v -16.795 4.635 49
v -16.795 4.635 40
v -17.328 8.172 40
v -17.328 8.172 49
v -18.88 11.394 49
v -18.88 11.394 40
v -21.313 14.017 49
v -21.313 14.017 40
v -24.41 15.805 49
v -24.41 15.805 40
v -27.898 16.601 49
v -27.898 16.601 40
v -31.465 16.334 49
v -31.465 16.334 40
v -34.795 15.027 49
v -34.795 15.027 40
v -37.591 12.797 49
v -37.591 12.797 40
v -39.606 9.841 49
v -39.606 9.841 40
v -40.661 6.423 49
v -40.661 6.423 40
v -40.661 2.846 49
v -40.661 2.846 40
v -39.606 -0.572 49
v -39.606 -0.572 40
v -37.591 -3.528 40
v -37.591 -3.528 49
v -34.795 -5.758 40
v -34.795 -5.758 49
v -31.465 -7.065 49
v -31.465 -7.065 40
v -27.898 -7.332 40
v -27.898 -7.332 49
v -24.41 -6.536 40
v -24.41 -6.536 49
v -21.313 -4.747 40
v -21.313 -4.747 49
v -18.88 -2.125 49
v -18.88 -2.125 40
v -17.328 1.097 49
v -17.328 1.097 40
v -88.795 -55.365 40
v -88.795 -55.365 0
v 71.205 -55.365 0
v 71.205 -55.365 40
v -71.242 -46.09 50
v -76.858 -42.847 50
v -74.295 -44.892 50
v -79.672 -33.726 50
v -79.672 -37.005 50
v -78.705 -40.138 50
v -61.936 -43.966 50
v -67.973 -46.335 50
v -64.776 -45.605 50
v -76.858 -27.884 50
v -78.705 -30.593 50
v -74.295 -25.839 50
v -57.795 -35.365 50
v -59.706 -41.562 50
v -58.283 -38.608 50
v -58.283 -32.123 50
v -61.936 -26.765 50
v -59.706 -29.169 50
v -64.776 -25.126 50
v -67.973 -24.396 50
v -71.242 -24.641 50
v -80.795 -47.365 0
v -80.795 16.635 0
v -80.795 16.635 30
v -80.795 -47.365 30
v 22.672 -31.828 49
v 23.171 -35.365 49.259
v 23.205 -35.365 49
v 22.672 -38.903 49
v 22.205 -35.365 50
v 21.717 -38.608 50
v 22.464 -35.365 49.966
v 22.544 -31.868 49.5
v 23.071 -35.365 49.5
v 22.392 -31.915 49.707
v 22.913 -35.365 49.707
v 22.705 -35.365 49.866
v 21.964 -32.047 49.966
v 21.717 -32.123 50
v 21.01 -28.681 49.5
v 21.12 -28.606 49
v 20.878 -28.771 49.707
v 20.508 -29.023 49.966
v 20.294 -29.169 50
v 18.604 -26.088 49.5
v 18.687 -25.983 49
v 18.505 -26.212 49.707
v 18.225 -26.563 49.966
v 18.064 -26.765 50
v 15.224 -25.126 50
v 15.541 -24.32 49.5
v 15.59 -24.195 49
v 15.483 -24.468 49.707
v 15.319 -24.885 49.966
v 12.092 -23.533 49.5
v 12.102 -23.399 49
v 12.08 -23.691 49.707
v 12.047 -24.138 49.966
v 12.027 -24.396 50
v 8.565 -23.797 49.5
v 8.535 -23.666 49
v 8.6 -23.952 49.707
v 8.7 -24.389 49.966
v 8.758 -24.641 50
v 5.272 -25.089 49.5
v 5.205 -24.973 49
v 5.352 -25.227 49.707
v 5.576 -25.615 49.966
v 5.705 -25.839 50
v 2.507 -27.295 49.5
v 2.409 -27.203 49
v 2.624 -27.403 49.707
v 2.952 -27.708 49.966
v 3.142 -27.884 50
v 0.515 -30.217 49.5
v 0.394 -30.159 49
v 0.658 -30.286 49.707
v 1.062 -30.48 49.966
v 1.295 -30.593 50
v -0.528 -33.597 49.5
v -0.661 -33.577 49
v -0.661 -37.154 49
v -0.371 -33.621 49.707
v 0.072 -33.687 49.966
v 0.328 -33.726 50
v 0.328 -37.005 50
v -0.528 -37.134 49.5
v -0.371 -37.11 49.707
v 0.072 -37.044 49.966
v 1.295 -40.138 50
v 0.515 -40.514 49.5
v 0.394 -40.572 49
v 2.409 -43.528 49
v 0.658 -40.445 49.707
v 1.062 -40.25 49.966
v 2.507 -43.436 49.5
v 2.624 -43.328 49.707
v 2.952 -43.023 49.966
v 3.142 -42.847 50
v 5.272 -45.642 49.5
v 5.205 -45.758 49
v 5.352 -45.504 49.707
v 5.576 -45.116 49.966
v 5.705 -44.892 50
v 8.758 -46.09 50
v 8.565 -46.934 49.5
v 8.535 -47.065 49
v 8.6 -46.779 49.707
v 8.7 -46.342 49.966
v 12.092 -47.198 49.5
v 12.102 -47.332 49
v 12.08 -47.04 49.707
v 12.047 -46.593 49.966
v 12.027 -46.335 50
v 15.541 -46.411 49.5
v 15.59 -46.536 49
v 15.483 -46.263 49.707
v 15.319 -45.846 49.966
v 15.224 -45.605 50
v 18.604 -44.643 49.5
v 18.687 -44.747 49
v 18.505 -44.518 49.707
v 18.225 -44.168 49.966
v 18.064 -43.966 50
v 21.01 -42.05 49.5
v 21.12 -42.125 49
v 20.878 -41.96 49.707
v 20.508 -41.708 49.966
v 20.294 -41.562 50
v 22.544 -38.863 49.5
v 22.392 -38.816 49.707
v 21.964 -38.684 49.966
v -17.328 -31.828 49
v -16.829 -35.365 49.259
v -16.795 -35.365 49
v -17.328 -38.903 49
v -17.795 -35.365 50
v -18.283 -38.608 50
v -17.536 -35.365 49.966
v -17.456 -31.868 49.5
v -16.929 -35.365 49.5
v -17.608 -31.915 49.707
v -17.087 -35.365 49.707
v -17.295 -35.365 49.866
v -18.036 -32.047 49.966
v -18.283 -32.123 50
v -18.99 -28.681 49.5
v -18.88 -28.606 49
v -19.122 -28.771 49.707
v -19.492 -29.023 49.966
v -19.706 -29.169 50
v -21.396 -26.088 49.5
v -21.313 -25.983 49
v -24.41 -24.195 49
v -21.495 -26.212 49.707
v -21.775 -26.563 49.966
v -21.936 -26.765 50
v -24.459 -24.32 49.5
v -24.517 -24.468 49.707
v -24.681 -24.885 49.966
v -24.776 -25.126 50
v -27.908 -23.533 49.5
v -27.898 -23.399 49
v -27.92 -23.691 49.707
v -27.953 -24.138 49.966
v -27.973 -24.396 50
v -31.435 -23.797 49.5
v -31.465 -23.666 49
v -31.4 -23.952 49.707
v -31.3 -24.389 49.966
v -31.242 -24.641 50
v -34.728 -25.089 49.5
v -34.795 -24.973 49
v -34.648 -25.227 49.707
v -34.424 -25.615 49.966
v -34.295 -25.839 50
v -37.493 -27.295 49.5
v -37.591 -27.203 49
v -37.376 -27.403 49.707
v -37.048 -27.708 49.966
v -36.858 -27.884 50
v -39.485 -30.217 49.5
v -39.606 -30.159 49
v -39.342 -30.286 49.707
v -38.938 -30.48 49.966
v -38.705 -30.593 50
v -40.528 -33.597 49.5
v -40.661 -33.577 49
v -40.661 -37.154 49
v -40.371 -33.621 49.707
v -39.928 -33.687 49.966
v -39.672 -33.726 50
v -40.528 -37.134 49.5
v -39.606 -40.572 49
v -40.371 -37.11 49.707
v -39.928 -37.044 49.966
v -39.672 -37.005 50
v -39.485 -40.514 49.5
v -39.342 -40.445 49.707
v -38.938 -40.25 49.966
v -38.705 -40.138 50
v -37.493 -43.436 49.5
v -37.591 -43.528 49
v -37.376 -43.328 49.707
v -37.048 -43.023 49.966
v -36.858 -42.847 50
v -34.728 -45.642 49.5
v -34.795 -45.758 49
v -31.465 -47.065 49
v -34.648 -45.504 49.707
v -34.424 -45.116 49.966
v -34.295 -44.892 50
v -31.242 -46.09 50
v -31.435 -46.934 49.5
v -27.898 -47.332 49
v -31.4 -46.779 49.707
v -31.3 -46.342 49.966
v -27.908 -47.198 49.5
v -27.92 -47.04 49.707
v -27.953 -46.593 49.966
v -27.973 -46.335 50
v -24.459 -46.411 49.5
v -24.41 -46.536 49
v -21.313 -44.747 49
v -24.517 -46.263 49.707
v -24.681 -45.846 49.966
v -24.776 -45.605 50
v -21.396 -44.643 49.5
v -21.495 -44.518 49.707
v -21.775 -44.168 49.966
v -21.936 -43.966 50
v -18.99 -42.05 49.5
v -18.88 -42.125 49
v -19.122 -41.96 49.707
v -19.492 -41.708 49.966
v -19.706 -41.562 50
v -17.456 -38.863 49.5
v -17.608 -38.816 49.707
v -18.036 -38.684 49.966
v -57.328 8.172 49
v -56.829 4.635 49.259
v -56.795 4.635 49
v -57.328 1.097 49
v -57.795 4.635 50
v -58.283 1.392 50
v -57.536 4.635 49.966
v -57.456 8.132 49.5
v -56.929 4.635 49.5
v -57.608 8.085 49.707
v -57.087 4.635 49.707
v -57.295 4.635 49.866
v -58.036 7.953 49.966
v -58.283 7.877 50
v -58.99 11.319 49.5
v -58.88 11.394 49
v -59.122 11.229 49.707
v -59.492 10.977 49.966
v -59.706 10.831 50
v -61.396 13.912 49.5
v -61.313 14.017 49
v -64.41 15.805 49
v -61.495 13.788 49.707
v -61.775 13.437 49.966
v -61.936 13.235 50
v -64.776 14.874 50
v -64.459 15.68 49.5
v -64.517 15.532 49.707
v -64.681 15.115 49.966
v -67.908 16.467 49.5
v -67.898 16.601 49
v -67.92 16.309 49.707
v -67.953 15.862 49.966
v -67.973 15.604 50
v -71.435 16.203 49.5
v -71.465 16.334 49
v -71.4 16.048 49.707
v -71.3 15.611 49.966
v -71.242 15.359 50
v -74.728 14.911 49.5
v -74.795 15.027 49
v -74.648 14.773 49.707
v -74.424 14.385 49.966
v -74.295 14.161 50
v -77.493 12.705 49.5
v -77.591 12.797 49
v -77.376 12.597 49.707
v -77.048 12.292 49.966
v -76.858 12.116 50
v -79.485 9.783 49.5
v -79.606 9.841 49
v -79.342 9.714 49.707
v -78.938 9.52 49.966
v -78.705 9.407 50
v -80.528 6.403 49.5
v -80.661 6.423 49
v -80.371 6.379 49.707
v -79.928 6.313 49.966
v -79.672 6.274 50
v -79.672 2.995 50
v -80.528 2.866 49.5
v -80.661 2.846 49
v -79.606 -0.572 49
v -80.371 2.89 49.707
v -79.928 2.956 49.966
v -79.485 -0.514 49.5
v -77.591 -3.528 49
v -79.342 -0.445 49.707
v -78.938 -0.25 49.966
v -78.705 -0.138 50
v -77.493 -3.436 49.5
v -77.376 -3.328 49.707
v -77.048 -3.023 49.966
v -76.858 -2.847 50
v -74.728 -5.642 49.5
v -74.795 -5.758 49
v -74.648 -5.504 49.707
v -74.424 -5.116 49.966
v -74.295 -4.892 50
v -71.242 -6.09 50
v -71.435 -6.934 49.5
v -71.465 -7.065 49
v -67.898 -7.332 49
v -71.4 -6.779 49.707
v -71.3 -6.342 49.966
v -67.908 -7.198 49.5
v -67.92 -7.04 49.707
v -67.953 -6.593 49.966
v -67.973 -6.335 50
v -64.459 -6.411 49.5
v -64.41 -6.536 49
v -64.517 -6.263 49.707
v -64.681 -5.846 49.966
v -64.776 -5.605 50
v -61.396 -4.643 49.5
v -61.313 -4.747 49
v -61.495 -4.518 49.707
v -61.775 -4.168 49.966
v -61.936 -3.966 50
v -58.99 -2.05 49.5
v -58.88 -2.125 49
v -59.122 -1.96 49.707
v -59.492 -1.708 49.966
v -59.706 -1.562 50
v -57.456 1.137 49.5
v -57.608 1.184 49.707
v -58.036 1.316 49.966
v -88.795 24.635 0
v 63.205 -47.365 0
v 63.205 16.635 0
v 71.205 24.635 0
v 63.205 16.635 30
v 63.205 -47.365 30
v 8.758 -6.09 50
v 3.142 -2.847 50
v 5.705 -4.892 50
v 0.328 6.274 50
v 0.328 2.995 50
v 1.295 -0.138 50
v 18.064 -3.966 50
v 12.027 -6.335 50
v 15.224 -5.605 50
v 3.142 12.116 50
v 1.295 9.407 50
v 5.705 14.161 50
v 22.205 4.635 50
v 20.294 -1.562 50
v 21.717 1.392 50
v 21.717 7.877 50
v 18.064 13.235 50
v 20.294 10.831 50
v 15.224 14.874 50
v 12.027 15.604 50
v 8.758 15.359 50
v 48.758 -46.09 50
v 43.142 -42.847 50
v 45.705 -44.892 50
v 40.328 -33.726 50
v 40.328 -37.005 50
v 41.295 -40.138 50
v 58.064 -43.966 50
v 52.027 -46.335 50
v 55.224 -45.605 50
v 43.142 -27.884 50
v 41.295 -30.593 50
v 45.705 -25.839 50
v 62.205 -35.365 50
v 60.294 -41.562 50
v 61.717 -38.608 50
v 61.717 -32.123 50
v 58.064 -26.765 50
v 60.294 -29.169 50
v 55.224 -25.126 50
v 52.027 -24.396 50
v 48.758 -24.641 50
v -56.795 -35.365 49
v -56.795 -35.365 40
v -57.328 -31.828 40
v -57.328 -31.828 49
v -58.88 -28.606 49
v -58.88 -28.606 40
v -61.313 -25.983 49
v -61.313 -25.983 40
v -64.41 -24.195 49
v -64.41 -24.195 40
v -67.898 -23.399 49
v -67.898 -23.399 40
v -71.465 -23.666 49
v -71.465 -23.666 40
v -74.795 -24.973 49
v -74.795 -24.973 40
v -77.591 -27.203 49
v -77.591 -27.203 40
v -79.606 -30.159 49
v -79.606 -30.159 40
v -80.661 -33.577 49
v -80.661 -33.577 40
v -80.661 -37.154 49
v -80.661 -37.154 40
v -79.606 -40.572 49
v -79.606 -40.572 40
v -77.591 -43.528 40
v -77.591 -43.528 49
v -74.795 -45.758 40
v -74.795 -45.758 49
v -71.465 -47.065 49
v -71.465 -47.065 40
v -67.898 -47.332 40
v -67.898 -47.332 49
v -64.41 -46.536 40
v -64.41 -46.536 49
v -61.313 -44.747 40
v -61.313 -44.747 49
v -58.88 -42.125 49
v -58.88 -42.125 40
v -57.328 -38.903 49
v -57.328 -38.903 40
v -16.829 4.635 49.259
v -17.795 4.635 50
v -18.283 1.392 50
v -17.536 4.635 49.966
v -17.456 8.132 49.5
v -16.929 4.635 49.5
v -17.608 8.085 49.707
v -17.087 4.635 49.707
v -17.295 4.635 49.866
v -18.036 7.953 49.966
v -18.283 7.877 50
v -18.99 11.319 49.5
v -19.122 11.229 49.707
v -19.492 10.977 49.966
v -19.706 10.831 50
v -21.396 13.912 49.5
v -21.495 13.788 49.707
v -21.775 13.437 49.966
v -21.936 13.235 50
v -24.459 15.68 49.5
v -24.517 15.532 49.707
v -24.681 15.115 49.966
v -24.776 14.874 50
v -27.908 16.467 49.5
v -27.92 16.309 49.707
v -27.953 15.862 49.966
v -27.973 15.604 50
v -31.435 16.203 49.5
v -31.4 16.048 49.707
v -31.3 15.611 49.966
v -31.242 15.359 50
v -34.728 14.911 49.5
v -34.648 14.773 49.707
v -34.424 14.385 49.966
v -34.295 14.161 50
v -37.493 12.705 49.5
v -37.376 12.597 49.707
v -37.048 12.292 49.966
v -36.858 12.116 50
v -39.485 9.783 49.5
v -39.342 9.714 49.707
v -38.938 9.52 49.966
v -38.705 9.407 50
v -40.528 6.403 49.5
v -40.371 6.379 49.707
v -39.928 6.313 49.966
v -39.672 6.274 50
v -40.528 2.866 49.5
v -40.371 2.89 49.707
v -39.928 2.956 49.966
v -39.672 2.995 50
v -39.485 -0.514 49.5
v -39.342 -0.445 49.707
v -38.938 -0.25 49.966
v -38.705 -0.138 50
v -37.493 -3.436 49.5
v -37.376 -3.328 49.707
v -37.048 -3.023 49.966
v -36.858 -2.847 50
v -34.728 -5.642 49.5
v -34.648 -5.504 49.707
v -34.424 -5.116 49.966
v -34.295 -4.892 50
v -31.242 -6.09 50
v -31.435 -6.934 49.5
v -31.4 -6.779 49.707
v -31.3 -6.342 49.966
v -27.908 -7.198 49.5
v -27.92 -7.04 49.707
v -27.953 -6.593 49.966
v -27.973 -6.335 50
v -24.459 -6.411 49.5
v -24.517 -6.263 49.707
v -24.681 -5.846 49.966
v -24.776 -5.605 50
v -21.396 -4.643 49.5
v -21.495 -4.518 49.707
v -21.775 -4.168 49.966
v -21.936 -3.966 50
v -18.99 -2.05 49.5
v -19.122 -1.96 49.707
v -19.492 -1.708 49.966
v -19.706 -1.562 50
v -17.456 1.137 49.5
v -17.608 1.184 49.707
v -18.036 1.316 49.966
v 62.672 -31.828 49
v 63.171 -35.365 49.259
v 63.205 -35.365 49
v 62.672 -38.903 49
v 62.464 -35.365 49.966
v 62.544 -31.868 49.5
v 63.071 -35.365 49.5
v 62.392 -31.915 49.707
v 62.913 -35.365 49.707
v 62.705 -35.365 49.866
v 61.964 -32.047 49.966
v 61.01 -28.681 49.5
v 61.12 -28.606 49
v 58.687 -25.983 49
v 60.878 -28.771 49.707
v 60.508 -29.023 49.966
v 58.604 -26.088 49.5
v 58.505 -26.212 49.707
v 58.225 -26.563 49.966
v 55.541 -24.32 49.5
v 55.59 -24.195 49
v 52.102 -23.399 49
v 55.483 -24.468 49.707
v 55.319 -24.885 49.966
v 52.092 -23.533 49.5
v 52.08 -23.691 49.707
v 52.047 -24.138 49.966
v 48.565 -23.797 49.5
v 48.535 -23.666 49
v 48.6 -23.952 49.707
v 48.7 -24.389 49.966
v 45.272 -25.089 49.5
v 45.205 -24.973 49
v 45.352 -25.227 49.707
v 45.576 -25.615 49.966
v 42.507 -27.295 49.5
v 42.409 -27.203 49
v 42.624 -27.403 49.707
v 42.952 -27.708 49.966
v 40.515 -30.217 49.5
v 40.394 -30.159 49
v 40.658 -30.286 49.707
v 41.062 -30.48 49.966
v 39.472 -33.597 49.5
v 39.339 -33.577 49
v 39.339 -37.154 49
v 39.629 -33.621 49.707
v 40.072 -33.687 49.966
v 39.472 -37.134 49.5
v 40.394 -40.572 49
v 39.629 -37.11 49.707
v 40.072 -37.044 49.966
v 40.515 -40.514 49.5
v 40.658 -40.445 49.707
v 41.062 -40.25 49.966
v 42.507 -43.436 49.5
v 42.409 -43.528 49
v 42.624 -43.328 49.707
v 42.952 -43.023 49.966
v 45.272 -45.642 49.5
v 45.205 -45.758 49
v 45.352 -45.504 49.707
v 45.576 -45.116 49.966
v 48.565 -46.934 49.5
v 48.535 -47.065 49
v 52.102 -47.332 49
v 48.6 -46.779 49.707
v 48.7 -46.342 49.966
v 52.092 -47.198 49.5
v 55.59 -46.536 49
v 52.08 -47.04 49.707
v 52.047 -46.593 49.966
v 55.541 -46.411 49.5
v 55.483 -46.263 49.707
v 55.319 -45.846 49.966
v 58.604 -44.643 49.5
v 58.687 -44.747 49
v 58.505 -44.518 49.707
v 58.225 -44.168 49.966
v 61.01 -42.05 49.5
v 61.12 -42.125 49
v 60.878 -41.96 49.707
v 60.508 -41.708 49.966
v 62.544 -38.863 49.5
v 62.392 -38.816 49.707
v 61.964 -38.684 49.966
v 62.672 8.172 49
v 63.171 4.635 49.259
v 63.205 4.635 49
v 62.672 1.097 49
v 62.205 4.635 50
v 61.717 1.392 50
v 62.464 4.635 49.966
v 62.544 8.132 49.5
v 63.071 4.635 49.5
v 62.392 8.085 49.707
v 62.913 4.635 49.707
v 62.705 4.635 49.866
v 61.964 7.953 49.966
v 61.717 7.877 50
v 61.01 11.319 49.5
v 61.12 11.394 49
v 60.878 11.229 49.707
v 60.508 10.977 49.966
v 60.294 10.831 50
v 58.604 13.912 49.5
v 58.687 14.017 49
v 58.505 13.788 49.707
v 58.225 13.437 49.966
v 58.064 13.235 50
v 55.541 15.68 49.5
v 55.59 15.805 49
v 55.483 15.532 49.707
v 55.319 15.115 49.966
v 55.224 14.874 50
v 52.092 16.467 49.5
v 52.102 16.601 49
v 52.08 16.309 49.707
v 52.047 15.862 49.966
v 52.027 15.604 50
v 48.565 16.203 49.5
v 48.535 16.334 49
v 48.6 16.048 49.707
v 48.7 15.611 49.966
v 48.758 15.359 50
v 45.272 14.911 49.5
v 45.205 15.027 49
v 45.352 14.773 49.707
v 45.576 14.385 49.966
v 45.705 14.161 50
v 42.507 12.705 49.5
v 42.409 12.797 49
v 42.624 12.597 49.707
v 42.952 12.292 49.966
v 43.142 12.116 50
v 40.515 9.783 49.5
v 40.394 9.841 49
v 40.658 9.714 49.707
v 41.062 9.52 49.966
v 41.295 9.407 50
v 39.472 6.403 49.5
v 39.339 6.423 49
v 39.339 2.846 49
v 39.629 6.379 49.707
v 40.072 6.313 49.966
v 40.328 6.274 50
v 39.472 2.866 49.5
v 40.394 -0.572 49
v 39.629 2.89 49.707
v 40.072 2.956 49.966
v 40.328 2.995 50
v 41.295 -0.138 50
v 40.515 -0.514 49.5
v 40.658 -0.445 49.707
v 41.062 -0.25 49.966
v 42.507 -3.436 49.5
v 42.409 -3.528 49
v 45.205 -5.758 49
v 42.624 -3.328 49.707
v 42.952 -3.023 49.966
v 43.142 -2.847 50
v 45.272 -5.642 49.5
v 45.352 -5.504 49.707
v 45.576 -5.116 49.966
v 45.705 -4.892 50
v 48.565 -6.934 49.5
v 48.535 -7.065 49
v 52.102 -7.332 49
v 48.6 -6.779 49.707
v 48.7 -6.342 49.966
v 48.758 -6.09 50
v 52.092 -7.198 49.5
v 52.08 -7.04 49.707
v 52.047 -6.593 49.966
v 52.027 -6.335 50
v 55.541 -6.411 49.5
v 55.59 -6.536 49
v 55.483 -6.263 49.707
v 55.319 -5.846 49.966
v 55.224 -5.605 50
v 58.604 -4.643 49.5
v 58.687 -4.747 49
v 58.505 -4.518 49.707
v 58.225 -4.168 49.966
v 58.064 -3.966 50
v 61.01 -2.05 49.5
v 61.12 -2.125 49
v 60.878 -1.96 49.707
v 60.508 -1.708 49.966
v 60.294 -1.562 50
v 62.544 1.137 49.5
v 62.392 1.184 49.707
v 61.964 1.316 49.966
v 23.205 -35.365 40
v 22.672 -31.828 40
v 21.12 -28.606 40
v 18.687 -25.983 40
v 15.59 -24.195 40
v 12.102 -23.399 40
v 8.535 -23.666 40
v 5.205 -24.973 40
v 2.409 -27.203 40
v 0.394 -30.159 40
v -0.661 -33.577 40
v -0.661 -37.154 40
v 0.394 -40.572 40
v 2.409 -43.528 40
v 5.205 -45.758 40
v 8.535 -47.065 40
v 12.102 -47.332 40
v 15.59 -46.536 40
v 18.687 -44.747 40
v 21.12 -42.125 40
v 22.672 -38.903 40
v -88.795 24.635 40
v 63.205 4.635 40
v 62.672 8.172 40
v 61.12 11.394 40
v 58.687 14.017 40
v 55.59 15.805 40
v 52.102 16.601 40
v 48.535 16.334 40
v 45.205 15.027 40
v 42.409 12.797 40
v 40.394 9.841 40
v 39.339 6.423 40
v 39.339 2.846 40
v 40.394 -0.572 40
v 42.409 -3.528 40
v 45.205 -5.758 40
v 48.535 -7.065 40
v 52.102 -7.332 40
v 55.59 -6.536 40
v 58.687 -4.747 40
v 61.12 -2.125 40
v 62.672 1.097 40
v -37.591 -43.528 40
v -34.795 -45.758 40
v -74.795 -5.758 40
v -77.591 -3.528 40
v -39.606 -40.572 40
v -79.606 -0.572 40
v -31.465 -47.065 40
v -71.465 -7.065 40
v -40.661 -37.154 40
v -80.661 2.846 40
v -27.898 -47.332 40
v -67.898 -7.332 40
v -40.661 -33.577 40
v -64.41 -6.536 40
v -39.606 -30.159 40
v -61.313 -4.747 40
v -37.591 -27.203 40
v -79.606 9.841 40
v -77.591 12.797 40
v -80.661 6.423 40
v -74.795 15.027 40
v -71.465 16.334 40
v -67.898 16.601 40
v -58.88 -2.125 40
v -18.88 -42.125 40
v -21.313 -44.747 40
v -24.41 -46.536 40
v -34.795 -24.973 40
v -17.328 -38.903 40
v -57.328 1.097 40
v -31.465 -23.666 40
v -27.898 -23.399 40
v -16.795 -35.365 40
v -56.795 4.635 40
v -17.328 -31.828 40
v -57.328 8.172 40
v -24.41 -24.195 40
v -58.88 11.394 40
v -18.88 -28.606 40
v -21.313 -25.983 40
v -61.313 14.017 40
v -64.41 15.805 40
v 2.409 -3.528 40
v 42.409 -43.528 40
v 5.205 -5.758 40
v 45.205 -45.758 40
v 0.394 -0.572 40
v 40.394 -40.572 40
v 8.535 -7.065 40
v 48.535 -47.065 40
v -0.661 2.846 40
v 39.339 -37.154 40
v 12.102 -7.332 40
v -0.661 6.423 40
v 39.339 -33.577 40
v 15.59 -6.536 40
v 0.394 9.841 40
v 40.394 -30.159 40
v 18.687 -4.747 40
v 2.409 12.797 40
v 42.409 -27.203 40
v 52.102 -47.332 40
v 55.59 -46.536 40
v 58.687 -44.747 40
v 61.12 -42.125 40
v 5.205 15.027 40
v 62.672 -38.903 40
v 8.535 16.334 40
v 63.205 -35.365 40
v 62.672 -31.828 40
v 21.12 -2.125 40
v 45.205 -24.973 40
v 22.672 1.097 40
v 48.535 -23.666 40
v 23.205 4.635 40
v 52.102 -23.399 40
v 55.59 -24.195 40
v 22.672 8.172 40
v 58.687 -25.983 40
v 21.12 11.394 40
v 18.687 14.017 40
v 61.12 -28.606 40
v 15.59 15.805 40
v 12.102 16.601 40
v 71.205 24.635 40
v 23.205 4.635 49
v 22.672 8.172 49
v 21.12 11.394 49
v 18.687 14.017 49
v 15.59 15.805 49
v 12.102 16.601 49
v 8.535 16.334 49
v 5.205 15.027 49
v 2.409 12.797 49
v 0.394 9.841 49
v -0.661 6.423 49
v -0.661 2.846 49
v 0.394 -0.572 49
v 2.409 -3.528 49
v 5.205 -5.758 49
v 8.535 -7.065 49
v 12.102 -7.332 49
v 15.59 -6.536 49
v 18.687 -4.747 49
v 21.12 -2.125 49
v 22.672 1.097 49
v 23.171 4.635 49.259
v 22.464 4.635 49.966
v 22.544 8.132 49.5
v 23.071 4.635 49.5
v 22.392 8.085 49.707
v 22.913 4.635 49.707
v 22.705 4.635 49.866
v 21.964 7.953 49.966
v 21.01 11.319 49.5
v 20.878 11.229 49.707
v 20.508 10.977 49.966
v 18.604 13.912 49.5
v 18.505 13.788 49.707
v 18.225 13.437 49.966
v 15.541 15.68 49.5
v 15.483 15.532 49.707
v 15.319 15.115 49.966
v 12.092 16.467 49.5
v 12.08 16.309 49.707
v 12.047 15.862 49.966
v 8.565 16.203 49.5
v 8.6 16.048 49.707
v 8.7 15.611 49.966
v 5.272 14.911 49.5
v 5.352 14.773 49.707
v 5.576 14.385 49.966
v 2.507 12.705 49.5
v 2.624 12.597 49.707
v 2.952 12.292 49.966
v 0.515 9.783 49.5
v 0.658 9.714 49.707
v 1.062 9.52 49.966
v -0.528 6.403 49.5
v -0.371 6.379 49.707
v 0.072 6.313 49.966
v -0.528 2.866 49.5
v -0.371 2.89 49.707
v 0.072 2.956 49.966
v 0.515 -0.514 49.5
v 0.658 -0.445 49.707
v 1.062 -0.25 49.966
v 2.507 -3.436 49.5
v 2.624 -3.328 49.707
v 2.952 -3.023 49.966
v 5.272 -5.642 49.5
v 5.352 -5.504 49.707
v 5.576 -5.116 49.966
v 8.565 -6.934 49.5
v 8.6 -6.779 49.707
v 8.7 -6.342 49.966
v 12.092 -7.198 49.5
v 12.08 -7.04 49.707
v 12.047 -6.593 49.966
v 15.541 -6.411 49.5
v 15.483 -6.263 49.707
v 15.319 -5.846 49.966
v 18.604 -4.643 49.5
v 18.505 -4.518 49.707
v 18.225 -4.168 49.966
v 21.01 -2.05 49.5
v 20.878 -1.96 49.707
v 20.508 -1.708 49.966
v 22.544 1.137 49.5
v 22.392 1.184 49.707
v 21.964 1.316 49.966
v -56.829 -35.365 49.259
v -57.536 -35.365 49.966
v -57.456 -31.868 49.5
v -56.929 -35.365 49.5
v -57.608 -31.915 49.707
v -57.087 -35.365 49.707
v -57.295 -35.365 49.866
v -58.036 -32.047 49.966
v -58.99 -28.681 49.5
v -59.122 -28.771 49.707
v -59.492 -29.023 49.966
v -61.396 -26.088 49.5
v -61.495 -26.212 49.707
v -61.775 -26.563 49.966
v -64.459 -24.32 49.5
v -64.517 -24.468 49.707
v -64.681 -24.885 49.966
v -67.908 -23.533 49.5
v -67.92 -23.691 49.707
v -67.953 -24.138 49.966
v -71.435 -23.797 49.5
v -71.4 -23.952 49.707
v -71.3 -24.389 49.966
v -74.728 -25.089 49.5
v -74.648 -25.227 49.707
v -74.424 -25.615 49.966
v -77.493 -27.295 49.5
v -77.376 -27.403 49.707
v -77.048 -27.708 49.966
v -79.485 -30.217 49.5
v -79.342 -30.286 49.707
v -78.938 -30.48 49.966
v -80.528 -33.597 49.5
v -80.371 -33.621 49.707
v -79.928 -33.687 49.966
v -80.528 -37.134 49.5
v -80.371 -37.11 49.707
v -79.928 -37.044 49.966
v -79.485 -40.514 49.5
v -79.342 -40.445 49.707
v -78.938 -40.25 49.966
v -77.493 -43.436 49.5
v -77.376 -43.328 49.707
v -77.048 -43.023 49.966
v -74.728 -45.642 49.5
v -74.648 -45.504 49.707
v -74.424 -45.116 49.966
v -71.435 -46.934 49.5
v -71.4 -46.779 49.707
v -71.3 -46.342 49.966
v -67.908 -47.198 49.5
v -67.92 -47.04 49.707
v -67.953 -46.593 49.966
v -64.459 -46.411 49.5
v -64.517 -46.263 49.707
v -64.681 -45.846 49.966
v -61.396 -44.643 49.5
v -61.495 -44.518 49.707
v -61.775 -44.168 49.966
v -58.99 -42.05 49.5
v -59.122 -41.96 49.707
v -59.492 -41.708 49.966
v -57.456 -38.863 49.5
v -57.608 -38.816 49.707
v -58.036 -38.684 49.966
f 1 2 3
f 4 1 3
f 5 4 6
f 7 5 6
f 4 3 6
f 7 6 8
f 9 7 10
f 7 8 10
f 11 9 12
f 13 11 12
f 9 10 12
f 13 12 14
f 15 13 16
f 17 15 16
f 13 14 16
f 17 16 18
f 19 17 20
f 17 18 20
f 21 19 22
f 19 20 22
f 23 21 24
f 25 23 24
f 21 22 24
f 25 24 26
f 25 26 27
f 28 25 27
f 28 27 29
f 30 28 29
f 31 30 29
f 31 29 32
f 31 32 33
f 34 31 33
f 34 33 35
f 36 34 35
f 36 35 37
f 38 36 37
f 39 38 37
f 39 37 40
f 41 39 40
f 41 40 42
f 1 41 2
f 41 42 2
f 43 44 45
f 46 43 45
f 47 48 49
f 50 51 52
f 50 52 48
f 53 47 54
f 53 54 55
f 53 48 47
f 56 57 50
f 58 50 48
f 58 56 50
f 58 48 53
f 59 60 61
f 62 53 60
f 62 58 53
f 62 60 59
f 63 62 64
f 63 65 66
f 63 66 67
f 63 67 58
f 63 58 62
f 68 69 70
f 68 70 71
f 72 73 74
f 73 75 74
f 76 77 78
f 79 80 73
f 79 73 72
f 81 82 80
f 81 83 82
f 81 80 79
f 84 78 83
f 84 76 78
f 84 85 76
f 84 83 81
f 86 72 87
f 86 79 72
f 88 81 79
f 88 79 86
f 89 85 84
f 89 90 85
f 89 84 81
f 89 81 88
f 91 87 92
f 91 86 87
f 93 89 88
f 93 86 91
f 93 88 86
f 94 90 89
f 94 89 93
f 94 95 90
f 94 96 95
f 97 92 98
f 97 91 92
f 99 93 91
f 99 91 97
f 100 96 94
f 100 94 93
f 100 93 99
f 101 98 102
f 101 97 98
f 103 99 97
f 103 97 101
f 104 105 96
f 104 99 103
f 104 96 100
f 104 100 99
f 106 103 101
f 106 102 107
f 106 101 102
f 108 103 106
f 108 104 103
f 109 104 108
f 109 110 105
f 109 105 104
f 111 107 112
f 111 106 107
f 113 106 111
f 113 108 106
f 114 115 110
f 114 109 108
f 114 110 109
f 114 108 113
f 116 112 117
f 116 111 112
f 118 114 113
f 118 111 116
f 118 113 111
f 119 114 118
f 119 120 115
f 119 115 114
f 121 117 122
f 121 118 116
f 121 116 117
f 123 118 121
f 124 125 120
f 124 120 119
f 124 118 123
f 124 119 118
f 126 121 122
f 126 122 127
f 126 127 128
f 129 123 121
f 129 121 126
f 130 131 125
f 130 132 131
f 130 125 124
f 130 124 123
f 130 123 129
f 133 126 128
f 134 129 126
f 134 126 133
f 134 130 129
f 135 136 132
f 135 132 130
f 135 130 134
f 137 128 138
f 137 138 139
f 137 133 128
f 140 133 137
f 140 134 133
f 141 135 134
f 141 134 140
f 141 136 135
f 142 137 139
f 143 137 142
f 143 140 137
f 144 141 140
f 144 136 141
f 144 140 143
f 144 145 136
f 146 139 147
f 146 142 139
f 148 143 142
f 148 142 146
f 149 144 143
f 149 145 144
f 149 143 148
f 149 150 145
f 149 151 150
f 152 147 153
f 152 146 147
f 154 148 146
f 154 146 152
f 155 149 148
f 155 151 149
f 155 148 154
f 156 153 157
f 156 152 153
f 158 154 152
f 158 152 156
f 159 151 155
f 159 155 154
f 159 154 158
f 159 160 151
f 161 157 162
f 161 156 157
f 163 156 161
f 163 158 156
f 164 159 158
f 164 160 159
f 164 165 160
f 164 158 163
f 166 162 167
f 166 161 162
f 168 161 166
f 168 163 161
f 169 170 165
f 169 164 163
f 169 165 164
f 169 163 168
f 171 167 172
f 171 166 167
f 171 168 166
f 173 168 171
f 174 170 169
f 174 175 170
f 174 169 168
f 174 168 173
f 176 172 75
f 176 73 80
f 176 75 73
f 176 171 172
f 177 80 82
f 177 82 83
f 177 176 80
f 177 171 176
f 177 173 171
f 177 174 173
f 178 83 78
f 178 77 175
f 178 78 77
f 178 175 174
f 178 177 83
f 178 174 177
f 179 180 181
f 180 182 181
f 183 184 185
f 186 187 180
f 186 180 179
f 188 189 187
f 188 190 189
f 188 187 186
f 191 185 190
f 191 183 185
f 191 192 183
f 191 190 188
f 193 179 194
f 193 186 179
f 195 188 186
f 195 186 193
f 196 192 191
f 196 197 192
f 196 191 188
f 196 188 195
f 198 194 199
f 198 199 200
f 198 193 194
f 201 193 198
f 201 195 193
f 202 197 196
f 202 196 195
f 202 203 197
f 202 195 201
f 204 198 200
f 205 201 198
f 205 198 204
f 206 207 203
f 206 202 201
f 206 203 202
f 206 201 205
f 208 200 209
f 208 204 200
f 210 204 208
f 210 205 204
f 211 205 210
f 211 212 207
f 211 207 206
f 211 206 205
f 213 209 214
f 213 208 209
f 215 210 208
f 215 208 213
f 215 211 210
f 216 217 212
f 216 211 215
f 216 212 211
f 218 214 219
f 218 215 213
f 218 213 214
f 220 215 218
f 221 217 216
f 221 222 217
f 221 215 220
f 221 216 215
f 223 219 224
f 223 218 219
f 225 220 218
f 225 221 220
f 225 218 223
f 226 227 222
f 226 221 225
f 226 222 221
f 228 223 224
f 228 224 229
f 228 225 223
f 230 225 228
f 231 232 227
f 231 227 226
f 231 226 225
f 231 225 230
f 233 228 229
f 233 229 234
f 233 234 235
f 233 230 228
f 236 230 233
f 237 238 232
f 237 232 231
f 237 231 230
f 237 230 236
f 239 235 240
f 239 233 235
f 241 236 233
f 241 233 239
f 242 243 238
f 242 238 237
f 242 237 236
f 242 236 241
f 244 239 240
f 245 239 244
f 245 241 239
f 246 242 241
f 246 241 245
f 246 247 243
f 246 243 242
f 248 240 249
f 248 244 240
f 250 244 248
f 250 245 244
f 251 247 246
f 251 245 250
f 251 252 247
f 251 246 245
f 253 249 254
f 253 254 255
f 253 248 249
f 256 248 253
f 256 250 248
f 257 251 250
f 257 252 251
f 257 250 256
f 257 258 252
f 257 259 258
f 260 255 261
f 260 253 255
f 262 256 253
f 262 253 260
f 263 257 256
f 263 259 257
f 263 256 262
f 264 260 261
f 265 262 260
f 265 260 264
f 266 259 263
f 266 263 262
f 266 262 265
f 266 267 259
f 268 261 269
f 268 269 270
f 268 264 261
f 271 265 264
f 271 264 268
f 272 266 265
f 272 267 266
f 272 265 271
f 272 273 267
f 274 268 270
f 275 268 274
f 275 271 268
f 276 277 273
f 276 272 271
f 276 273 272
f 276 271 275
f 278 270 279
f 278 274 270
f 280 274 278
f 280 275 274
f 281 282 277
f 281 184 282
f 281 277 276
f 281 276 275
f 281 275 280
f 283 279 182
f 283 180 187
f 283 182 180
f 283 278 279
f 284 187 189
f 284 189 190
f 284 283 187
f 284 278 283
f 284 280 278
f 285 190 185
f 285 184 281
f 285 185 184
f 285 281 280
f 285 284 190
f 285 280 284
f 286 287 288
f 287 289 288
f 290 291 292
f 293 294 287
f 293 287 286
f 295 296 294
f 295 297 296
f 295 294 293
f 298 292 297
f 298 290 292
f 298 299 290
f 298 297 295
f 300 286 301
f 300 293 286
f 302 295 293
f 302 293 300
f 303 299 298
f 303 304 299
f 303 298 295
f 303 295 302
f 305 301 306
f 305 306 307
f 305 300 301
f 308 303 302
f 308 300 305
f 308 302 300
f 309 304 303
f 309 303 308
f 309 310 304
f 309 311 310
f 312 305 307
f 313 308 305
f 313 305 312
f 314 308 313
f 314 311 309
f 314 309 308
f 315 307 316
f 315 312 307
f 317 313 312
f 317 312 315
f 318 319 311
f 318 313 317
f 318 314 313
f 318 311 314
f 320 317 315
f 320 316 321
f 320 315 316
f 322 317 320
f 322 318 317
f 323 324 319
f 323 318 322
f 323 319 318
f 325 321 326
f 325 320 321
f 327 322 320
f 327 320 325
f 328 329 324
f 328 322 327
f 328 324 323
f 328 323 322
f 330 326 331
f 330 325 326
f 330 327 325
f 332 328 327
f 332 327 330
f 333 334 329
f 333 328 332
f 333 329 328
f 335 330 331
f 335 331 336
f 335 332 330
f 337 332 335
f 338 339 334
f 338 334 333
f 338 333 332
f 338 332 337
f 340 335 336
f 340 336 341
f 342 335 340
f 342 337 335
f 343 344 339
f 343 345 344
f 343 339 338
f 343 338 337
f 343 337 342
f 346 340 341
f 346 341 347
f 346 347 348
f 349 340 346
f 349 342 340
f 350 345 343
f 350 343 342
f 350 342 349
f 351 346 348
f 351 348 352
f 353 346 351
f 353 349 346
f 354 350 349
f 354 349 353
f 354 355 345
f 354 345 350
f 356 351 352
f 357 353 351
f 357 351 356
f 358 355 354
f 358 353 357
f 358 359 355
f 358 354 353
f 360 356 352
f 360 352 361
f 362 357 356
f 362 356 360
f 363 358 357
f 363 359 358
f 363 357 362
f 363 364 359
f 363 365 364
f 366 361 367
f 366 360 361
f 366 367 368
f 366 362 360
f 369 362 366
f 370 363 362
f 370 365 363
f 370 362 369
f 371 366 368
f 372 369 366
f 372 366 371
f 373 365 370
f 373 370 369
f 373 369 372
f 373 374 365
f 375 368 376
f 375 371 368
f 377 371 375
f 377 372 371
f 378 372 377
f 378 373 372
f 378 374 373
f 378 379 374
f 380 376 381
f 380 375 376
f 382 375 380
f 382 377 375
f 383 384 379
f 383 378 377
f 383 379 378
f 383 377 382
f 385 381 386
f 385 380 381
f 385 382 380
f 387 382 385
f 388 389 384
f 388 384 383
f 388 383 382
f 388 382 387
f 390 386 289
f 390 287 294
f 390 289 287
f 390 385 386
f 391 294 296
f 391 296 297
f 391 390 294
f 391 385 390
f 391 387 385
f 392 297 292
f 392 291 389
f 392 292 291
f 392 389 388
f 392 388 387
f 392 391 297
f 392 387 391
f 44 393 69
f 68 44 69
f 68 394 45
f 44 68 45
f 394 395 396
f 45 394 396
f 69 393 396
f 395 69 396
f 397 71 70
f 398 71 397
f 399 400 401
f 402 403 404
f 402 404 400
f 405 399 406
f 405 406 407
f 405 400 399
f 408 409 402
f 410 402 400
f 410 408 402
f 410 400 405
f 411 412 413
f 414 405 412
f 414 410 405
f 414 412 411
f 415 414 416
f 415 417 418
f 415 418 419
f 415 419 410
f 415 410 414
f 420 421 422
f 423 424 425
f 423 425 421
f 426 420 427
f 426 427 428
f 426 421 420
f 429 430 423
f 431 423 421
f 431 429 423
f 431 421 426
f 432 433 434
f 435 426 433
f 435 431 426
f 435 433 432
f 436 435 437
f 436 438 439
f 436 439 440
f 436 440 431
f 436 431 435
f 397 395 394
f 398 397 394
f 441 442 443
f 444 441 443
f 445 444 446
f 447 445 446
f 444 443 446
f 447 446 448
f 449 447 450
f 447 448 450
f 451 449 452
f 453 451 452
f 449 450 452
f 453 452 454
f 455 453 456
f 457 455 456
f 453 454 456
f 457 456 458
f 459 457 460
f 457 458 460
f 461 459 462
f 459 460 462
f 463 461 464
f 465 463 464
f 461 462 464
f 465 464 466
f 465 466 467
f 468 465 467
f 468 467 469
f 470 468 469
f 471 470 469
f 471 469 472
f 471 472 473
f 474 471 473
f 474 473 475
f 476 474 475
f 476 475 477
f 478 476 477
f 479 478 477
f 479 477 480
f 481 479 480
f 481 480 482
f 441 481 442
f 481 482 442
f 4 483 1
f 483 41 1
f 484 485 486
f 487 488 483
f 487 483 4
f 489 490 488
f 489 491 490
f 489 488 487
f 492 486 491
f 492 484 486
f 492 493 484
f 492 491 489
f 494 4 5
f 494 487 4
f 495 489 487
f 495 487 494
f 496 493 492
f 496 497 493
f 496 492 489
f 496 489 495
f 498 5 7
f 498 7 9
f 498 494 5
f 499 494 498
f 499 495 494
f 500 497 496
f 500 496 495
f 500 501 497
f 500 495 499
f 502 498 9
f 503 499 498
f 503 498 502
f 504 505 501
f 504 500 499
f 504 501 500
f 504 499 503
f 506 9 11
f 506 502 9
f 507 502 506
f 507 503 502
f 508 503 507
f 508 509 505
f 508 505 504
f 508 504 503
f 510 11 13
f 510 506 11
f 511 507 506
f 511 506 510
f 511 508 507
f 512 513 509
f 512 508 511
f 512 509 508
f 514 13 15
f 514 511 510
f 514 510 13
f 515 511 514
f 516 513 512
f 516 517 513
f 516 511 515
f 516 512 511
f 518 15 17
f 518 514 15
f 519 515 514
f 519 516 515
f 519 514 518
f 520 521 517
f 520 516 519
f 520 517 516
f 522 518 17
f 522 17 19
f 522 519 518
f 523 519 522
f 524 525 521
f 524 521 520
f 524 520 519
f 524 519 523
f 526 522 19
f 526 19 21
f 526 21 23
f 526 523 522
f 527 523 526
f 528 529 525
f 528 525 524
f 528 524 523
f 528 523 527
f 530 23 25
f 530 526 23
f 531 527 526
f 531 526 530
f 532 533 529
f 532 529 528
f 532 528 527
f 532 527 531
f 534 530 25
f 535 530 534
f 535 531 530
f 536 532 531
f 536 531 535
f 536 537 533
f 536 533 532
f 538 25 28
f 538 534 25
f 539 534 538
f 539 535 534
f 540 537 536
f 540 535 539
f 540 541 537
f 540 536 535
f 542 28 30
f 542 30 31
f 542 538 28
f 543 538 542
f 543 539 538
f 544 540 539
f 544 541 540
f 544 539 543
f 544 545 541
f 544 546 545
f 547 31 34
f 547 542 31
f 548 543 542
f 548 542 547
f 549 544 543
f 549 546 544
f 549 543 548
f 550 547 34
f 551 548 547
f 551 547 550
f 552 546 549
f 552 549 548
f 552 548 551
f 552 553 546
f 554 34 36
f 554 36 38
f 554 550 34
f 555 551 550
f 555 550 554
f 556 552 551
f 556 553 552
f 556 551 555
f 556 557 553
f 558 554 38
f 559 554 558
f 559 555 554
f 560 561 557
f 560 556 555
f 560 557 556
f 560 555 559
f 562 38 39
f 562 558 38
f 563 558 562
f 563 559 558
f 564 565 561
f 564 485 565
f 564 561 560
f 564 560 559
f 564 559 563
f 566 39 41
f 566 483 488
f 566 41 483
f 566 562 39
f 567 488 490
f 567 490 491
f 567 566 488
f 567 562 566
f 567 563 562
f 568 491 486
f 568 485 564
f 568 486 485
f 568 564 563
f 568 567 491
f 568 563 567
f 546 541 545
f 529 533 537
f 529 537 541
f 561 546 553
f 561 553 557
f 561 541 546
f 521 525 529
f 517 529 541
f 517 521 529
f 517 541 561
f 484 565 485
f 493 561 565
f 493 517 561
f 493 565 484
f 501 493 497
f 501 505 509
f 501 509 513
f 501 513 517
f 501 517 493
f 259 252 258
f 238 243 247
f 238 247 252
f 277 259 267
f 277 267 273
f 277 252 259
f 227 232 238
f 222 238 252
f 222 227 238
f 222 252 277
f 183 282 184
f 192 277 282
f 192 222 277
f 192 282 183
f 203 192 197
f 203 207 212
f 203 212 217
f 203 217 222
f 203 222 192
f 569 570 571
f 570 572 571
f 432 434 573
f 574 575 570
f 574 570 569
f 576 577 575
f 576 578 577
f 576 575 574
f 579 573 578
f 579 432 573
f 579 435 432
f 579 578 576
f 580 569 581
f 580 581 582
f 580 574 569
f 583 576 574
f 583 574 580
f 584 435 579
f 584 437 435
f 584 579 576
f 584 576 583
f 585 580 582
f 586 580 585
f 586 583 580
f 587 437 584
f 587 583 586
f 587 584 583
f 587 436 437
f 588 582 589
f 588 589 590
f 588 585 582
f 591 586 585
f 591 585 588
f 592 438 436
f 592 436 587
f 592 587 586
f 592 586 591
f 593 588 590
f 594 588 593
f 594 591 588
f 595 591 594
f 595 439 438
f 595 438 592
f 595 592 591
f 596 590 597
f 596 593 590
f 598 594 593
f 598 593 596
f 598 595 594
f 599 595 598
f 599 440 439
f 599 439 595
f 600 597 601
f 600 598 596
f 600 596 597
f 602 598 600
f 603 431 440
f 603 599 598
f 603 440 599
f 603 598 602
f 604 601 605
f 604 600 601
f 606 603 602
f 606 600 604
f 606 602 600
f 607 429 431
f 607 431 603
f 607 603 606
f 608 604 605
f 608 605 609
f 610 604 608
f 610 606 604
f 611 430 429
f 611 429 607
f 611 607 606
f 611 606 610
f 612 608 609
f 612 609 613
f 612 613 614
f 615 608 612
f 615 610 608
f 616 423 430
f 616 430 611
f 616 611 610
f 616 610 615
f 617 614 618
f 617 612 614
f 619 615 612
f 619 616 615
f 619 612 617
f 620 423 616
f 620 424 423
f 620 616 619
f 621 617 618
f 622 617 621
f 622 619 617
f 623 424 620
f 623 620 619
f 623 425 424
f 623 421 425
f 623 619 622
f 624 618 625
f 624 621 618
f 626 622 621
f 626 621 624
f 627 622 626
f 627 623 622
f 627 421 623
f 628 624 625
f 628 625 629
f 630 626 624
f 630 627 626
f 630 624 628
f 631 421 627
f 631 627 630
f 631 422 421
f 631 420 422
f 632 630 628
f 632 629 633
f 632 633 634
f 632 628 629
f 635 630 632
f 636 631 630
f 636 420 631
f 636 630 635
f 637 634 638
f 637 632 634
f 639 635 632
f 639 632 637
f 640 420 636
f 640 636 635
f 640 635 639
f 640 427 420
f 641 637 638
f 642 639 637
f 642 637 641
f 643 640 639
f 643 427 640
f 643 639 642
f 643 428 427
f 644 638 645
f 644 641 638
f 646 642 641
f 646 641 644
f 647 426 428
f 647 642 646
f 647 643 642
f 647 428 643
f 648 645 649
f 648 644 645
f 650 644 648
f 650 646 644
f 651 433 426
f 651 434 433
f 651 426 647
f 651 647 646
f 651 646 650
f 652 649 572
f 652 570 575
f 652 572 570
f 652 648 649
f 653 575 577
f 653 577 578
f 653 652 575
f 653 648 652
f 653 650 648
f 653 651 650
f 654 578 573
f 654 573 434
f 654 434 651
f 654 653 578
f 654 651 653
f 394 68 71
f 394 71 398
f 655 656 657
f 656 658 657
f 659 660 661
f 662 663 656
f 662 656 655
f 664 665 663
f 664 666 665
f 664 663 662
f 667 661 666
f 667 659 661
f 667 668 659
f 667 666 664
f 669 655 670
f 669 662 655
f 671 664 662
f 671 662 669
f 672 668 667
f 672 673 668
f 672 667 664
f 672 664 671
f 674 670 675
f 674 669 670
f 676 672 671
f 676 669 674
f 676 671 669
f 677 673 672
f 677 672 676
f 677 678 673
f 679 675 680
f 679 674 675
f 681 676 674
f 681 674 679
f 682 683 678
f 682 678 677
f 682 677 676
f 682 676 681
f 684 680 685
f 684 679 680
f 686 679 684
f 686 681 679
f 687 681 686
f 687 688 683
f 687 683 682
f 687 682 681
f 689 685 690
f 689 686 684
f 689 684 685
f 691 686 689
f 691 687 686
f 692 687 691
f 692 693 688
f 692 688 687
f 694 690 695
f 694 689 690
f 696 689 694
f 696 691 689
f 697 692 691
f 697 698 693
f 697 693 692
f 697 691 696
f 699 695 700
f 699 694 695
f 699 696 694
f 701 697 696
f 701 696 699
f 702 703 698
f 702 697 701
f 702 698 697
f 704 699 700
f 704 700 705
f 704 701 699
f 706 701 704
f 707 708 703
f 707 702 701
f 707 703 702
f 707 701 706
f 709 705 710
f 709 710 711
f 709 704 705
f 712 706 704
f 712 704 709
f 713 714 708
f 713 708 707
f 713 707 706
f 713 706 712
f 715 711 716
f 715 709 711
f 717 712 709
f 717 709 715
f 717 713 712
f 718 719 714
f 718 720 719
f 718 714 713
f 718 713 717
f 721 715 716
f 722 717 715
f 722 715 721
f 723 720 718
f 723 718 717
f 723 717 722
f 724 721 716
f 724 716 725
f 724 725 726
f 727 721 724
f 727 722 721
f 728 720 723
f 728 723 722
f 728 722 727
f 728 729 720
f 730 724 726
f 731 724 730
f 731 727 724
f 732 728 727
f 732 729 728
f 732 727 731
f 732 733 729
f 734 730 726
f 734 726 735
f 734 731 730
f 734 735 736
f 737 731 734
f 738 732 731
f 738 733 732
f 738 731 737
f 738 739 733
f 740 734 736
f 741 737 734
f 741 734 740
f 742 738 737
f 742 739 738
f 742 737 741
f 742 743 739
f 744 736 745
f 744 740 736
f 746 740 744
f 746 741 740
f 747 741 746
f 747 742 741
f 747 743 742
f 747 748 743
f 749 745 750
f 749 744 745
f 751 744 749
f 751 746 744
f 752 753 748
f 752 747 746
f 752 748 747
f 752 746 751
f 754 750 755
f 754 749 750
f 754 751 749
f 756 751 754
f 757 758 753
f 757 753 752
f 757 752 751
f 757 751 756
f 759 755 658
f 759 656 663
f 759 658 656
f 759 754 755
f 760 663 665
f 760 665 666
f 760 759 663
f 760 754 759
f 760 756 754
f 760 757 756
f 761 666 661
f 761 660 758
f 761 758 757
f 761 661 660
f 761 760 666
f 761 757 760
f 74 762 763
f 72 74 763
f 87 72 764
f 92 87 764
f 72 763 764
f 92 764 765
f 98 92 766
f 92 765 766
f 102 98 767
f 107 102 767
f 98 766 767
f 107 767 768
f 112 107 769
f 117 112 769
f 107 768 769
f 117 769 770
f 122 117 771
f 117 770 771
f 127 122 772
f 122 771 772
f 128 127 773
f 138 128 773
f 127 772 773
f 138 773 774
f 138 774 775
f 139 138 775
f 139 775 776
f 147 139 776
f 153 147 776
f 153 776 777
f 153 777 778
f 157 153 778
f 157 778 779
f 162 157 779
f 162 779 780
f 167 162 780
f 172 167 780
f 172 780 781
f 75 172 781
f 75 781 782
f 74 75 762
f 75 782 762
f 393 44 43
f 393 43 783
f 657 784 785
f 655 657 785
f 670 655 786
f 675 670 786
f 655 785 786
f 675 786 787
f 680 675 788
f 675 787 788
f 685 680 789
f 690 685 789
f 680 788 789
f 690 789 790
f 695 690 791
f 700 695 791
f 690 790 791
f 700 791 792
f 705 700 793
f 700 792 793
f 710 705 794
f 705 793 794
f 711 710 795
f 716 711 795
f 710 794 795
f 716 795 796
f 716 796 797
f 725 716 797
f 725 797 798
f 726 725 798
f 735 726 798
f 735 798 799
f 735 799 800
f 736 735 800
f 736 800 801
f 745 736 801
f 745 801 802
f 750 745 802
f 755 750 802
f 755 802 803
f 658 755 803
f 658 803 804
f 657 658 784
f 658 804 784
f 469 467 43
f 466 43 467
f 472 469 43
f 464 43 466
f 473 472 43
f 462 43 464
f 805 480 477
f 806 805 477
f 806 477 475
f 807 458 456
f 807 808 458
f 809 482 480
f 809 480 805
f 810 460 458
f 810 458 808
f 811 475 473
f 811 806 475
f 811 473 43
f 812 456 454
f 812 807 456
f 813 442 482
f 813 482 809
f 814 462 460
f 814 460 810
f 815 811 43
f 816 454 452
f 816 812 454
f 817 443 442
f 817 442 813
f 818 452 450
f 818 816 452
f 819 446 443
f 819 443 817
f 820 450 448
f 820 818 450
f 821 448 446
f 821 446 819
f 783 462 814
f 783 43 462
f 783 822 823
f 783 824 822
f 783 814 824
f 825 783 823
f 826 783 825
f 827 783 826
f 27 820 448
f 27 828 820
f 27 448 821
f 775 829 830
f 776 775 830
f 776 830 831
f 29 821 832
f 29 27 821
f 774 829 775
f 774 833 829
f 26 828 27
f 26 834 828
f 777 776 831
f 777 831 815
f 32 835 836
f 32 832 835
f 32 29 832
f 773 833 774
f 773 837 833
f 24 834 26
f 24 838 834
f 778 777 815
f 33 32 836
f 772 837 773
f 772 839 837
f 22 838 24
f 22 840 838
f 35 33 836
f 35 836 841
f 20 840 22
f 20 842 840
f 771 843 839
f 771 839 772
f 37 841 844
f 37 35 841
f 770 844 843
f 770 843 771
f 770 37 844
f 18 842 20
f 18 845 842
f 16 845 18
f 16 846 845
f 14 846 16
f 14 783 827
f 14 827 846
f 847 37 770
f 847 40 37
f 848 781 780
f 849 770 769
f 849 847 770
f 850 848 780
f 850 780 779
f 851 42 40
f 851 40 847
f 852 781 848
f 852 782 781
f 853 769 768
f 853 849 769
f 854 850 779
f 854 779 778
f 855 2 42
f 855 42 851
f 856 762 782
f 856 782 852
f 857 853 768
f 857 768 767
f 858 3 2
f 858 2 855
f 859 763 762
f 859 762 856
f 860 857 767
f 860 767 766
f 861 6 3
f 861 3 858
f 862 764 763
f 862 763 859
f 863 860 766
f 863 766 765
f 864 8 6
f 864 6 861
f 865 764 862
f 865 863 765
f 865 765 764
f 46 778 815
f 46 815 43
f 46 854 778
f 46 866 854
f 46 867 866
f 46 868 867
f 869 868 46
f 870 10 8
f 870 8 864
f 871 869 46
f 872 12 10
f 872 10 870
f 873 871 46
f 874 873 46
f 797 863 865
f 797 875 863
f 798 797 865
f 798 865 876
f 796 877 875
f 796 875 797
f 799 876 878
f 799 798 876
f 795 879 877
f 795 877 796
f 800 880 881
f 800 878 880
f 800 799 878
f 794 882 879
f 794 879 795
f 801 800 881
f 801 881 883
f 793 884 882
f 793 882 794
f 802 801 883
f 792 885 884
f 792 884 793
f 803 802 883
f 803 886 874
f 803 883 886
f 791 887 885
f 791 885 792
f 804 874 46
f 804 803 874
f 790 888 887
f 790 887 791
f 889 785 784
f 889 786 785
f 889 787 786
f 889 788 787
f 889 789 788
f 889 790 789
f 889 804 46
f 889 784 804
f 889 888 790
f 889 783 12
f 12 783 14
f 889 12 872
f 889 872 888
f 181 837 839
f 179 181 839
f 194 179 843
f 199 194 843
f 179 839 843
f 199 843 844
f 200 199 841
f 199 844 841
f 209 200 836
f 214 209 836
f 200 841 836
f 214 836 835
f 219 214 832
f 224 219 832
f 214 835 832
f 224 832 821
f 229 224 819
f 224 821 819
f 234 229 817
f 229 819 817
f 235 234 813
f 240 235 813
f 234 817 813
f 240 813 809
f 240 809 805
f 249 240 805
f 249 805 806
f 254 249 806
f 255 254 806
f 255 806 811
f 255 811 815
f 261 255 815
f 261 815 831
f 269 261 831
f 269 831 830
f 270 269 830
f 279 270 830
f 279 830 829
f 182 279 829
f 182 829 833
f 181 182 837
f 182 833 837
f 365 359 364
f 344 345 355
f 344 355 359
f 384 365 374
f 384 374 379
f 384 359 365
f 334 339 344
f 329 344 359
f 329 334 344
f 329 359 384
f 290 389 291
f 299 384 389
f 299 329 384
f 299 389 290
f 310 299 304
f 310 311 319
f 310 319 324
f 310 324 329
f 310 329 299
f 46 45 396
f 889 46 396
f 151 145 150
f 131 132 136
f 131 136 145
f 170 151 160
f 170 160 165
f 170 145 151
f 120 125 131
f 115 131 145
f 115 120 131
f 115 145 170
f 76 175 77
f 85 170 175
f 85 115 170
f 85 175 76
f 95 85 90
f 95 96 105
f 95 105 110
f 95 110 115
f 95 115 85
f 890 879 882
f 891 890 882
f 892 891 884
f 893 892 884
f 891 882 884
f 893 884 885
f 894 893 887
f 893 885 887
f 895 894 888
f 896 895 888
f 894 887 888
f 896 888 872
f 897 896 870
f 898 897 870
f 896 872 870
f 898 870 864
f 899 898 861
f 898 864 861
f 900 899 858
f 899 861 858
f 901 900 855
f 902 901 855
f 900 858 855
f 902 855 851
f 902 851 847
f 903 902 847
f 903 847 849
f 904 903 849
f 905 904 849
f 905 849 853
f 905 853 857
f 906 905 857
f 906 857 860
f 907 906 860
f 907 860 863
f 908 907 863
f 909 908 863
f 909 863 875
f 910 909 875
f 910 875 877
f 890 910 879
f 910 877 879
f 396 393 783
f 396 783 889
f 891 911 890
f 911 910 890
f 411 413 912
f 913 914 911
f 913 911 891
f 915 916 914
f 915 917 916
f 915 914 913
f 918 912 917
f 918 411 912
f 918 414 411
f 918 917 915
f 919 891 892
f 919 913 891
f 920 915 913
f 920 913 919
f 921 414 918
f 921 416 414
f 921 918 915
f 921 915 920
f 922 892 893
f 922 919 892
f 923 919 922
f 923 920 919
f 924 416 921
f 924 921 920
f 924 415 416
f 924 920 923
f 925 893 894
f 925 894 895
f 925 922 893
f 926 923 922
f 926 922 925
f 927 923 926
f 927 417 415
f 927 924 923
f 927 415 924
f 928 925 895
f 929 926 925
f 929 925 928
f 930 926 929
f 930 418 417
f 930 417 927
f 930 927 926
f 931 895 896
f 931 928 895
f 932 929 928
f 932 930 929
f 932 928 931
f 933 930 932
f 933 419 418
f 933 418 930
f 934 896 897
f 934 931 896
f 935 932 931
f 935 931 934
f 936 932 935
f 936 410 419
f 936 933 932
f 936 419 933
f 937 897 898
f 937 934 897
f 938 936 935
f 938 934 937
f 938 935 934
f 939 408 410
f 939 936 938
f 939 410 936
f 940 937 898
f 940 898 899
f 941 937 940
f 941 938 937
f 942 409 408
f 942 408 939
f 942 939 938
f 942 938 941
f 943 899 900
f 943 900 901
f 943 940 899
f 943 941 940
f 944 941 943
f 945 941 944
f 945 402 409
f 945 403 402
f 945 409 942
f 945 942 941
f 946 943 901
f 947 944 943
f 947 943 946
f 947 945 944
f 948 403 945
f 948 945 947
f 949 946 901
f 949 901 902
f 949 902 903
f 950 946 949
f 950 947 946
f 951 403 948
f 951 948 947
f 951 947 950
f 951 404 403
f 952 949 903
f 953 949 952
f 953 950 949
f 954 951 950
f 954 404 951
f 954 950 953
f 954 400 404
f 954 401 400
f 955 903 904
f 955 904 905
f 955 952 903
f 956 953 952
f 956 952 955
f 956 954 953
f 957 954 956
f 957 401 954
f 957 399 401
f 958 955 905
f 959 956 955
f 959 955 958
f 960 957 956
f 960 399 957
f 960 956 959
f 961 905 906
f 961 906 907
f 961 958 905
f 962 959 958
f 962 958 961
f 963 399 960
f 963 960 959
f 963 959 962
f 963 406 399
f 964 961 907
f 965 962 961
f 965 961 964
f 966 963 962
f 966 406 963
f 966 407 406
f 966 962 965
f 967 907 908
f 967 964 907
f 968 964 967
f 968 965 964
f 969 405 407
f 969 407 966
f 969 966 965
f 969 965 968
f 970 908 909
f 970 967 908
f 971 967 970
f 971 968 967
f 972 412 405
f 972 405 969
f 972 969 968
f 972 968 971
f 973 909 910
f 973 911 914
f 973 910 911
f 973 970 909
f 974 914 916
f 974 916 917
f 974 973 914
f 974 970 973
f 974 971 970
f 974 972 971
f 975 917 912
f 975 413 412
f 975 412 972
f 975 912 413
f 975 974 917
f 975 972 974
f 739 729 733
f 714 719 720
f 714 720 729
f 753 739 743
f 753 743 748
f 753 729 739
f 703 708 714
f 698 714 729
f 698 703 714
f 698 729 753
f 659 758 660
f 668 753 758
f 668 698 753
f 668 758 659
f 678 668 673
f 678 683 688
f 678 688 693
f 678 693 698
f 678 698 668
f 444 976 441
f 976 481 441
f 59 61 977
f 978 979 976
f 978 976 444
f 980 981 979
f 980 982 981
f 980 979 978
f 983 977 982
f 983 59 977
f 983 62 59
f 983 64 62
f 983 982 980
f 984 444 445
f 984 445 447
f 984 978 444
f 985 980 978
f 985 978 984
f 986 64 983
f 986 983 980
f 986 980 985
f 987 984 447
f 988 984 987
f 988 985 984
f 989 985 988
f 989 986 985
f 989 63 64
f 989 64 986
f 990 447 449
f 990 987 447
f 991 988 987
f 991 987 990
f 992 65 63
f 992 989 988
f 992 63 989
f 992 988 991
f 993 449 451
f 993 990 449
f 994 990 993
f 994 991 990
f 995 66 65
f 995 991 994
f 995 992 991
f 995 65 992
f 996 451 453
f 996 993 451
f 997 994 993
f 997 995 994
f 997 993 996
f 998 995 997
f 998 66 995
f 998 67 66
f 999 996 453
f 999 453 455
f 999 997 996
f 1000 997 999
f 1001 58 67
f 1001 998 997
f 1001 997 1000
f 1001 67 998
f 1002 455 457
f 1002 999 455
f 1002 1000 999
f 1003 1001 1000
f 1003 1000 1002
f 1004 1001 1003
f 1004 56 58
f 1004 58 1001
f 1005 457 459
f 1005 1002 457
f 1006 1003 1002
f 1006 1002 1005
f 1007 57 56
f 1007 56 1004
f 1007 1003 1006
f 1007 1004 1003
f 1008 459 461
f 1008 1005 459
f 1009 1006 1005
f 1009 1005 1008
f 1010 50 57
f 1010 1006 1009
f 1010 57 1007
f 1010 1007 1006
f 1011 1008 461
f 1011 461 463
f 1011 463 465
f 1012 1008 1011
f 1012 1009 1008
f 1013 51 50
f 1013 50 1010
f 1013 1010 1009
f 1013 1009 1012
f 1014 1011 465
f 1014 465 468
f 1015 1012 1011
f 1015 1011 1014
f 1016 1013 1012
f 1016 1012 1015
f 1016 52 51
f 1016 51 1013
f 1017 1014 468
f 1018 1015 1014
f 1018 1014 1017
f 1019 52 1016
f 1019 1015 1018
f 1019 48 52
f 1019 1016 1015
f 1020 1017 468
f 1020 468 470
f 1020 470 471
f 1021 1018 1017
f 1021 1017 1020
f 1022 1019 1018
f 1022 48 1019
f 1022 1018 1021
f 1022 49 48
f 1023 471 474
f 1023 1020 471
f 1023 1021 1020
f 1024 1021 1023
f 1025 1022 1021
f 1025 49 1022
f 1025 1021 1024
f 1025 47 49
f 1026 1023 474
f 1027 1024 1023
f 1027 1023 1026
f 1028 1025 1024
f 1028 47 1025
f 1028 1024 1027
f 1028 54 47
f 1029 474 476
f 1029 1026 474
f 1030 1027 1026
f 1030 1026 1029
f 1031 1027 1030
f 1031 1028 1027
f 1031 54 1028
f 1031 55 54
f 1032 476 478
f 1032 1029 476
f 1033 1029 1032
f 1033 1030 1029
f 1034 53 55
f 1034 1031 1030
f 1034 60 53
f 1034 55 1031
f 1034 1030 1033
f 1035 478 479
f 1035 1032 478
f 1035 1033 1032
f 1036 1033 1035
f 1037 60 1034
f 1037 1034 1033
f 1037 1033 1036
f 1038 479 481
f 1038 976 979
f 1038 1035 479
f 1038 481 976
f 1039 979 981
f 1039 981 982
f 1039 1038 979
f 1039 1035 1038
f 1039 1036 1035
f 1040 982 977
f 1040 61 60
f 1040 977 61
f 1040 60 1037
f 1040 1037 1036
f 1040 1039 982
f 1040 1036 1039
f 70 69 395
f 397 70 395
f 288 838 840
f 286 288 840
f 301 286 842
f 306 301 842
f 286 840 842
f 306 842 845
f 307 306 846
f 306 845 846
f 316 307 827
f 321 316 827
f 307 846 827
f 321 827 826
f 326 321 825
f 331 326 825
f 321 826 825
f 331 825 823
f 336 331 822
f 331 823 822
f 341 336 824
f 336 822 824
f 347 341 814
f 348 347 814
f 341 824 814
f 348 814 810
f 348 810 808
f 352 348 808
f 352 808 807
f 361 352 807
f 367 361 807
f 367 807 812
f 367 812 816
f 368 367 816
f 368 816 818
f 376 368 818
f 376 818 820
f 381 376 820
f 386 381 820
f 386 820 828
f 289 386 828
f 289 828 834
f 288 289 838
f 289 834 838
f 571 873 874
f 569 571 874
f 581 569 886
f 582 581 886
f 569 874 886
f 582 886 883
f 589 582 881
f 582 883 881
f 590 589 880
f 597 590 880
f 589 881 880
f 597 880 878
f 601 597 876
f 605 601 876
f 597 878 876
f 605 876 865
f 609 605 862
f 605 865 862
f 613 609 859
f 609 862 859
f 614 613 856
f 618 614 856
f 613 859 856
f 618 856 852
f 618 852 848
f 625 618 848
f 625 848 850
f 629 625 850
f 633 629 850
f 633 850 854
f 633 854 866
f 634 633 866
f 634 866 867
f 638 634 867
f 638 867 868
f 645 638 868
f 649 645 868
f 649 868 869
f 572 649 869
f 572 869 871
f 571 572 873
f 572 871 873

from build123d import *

# Parameters (mm, degrees)
F0_W     = 160
F0_H     = 80
F1_DEPTH = 40
F2_W     = 144
F2_H     = 64
F3_DEPTH = 30
F4_R     = 12
F5_DEPTH = 10
F6_R     = 1


with BuildPart() as f1:
    # F0 (on Top) → F1 (new body)
    with BuildSketch(Plane.XY):
        with Locations((-8.794574, -15.365461)):
            Rectangle(F0_W, F0_H)
    extrude(amount=F1_DEPTH)

    # F2 (on face) → F3 (cut)
    with BuildSketch(Plane(origin=(0, 0, 0), x_dir=(1, 0, 0), z_dir=(0, 0, -1))):
        with Locations((-8.794574, 15.365461)):
            Rectangle(F2_W, F2_H)
    extrude(amount=-F3_DEPTH, mode=Mode.SUBTRACT)

    # F4 (on face) → F5 (join)
    with BuildSketch(Plane.XY.offset(40)):
        with Locations((-68.794574, 4.634539)):
            Circle(F4_R)
        with Locations((-68.794574, -35.365461)):
            Circle(F4_R)
        with Locations((-28.794574, 4.634539)):
            Circle(F4_R)
        with Locations((-28.794574, -35.365461)):
            Circle(F4_R)
        with Locations((11.205426, 4.634539)):
            Circle(F4_R)
        with Locations((11.205426, -35.365461)):
            Circle(F4_R)
        with Locations((51.205426, 4.634539)):
            Circle(F4_R)
        with Locations((51.205426, -35.365461)):
            Circle(F4_R)
    extrude(amount=F5_DEPTH)

    # F6
    f6_edges = [f1.edges().sort_by_distance(p)[0] for p in [
        (-80.794574, 4.634539, 50),
        (-40.794574, 4.634539, 50),
        (-0.794574, 4.634539, 50),
        (39.205426, 4.634539, 50),
        (39.205426, -35.365461, 50),
        (-0.794574, -35.365461, 50),
        (-40.794574, -35.365461, 50),
        (-80.794574, -35.365461, 50),
    ]]
    fillet(f6_edges, radius=F6_R)


solid = f1.part
